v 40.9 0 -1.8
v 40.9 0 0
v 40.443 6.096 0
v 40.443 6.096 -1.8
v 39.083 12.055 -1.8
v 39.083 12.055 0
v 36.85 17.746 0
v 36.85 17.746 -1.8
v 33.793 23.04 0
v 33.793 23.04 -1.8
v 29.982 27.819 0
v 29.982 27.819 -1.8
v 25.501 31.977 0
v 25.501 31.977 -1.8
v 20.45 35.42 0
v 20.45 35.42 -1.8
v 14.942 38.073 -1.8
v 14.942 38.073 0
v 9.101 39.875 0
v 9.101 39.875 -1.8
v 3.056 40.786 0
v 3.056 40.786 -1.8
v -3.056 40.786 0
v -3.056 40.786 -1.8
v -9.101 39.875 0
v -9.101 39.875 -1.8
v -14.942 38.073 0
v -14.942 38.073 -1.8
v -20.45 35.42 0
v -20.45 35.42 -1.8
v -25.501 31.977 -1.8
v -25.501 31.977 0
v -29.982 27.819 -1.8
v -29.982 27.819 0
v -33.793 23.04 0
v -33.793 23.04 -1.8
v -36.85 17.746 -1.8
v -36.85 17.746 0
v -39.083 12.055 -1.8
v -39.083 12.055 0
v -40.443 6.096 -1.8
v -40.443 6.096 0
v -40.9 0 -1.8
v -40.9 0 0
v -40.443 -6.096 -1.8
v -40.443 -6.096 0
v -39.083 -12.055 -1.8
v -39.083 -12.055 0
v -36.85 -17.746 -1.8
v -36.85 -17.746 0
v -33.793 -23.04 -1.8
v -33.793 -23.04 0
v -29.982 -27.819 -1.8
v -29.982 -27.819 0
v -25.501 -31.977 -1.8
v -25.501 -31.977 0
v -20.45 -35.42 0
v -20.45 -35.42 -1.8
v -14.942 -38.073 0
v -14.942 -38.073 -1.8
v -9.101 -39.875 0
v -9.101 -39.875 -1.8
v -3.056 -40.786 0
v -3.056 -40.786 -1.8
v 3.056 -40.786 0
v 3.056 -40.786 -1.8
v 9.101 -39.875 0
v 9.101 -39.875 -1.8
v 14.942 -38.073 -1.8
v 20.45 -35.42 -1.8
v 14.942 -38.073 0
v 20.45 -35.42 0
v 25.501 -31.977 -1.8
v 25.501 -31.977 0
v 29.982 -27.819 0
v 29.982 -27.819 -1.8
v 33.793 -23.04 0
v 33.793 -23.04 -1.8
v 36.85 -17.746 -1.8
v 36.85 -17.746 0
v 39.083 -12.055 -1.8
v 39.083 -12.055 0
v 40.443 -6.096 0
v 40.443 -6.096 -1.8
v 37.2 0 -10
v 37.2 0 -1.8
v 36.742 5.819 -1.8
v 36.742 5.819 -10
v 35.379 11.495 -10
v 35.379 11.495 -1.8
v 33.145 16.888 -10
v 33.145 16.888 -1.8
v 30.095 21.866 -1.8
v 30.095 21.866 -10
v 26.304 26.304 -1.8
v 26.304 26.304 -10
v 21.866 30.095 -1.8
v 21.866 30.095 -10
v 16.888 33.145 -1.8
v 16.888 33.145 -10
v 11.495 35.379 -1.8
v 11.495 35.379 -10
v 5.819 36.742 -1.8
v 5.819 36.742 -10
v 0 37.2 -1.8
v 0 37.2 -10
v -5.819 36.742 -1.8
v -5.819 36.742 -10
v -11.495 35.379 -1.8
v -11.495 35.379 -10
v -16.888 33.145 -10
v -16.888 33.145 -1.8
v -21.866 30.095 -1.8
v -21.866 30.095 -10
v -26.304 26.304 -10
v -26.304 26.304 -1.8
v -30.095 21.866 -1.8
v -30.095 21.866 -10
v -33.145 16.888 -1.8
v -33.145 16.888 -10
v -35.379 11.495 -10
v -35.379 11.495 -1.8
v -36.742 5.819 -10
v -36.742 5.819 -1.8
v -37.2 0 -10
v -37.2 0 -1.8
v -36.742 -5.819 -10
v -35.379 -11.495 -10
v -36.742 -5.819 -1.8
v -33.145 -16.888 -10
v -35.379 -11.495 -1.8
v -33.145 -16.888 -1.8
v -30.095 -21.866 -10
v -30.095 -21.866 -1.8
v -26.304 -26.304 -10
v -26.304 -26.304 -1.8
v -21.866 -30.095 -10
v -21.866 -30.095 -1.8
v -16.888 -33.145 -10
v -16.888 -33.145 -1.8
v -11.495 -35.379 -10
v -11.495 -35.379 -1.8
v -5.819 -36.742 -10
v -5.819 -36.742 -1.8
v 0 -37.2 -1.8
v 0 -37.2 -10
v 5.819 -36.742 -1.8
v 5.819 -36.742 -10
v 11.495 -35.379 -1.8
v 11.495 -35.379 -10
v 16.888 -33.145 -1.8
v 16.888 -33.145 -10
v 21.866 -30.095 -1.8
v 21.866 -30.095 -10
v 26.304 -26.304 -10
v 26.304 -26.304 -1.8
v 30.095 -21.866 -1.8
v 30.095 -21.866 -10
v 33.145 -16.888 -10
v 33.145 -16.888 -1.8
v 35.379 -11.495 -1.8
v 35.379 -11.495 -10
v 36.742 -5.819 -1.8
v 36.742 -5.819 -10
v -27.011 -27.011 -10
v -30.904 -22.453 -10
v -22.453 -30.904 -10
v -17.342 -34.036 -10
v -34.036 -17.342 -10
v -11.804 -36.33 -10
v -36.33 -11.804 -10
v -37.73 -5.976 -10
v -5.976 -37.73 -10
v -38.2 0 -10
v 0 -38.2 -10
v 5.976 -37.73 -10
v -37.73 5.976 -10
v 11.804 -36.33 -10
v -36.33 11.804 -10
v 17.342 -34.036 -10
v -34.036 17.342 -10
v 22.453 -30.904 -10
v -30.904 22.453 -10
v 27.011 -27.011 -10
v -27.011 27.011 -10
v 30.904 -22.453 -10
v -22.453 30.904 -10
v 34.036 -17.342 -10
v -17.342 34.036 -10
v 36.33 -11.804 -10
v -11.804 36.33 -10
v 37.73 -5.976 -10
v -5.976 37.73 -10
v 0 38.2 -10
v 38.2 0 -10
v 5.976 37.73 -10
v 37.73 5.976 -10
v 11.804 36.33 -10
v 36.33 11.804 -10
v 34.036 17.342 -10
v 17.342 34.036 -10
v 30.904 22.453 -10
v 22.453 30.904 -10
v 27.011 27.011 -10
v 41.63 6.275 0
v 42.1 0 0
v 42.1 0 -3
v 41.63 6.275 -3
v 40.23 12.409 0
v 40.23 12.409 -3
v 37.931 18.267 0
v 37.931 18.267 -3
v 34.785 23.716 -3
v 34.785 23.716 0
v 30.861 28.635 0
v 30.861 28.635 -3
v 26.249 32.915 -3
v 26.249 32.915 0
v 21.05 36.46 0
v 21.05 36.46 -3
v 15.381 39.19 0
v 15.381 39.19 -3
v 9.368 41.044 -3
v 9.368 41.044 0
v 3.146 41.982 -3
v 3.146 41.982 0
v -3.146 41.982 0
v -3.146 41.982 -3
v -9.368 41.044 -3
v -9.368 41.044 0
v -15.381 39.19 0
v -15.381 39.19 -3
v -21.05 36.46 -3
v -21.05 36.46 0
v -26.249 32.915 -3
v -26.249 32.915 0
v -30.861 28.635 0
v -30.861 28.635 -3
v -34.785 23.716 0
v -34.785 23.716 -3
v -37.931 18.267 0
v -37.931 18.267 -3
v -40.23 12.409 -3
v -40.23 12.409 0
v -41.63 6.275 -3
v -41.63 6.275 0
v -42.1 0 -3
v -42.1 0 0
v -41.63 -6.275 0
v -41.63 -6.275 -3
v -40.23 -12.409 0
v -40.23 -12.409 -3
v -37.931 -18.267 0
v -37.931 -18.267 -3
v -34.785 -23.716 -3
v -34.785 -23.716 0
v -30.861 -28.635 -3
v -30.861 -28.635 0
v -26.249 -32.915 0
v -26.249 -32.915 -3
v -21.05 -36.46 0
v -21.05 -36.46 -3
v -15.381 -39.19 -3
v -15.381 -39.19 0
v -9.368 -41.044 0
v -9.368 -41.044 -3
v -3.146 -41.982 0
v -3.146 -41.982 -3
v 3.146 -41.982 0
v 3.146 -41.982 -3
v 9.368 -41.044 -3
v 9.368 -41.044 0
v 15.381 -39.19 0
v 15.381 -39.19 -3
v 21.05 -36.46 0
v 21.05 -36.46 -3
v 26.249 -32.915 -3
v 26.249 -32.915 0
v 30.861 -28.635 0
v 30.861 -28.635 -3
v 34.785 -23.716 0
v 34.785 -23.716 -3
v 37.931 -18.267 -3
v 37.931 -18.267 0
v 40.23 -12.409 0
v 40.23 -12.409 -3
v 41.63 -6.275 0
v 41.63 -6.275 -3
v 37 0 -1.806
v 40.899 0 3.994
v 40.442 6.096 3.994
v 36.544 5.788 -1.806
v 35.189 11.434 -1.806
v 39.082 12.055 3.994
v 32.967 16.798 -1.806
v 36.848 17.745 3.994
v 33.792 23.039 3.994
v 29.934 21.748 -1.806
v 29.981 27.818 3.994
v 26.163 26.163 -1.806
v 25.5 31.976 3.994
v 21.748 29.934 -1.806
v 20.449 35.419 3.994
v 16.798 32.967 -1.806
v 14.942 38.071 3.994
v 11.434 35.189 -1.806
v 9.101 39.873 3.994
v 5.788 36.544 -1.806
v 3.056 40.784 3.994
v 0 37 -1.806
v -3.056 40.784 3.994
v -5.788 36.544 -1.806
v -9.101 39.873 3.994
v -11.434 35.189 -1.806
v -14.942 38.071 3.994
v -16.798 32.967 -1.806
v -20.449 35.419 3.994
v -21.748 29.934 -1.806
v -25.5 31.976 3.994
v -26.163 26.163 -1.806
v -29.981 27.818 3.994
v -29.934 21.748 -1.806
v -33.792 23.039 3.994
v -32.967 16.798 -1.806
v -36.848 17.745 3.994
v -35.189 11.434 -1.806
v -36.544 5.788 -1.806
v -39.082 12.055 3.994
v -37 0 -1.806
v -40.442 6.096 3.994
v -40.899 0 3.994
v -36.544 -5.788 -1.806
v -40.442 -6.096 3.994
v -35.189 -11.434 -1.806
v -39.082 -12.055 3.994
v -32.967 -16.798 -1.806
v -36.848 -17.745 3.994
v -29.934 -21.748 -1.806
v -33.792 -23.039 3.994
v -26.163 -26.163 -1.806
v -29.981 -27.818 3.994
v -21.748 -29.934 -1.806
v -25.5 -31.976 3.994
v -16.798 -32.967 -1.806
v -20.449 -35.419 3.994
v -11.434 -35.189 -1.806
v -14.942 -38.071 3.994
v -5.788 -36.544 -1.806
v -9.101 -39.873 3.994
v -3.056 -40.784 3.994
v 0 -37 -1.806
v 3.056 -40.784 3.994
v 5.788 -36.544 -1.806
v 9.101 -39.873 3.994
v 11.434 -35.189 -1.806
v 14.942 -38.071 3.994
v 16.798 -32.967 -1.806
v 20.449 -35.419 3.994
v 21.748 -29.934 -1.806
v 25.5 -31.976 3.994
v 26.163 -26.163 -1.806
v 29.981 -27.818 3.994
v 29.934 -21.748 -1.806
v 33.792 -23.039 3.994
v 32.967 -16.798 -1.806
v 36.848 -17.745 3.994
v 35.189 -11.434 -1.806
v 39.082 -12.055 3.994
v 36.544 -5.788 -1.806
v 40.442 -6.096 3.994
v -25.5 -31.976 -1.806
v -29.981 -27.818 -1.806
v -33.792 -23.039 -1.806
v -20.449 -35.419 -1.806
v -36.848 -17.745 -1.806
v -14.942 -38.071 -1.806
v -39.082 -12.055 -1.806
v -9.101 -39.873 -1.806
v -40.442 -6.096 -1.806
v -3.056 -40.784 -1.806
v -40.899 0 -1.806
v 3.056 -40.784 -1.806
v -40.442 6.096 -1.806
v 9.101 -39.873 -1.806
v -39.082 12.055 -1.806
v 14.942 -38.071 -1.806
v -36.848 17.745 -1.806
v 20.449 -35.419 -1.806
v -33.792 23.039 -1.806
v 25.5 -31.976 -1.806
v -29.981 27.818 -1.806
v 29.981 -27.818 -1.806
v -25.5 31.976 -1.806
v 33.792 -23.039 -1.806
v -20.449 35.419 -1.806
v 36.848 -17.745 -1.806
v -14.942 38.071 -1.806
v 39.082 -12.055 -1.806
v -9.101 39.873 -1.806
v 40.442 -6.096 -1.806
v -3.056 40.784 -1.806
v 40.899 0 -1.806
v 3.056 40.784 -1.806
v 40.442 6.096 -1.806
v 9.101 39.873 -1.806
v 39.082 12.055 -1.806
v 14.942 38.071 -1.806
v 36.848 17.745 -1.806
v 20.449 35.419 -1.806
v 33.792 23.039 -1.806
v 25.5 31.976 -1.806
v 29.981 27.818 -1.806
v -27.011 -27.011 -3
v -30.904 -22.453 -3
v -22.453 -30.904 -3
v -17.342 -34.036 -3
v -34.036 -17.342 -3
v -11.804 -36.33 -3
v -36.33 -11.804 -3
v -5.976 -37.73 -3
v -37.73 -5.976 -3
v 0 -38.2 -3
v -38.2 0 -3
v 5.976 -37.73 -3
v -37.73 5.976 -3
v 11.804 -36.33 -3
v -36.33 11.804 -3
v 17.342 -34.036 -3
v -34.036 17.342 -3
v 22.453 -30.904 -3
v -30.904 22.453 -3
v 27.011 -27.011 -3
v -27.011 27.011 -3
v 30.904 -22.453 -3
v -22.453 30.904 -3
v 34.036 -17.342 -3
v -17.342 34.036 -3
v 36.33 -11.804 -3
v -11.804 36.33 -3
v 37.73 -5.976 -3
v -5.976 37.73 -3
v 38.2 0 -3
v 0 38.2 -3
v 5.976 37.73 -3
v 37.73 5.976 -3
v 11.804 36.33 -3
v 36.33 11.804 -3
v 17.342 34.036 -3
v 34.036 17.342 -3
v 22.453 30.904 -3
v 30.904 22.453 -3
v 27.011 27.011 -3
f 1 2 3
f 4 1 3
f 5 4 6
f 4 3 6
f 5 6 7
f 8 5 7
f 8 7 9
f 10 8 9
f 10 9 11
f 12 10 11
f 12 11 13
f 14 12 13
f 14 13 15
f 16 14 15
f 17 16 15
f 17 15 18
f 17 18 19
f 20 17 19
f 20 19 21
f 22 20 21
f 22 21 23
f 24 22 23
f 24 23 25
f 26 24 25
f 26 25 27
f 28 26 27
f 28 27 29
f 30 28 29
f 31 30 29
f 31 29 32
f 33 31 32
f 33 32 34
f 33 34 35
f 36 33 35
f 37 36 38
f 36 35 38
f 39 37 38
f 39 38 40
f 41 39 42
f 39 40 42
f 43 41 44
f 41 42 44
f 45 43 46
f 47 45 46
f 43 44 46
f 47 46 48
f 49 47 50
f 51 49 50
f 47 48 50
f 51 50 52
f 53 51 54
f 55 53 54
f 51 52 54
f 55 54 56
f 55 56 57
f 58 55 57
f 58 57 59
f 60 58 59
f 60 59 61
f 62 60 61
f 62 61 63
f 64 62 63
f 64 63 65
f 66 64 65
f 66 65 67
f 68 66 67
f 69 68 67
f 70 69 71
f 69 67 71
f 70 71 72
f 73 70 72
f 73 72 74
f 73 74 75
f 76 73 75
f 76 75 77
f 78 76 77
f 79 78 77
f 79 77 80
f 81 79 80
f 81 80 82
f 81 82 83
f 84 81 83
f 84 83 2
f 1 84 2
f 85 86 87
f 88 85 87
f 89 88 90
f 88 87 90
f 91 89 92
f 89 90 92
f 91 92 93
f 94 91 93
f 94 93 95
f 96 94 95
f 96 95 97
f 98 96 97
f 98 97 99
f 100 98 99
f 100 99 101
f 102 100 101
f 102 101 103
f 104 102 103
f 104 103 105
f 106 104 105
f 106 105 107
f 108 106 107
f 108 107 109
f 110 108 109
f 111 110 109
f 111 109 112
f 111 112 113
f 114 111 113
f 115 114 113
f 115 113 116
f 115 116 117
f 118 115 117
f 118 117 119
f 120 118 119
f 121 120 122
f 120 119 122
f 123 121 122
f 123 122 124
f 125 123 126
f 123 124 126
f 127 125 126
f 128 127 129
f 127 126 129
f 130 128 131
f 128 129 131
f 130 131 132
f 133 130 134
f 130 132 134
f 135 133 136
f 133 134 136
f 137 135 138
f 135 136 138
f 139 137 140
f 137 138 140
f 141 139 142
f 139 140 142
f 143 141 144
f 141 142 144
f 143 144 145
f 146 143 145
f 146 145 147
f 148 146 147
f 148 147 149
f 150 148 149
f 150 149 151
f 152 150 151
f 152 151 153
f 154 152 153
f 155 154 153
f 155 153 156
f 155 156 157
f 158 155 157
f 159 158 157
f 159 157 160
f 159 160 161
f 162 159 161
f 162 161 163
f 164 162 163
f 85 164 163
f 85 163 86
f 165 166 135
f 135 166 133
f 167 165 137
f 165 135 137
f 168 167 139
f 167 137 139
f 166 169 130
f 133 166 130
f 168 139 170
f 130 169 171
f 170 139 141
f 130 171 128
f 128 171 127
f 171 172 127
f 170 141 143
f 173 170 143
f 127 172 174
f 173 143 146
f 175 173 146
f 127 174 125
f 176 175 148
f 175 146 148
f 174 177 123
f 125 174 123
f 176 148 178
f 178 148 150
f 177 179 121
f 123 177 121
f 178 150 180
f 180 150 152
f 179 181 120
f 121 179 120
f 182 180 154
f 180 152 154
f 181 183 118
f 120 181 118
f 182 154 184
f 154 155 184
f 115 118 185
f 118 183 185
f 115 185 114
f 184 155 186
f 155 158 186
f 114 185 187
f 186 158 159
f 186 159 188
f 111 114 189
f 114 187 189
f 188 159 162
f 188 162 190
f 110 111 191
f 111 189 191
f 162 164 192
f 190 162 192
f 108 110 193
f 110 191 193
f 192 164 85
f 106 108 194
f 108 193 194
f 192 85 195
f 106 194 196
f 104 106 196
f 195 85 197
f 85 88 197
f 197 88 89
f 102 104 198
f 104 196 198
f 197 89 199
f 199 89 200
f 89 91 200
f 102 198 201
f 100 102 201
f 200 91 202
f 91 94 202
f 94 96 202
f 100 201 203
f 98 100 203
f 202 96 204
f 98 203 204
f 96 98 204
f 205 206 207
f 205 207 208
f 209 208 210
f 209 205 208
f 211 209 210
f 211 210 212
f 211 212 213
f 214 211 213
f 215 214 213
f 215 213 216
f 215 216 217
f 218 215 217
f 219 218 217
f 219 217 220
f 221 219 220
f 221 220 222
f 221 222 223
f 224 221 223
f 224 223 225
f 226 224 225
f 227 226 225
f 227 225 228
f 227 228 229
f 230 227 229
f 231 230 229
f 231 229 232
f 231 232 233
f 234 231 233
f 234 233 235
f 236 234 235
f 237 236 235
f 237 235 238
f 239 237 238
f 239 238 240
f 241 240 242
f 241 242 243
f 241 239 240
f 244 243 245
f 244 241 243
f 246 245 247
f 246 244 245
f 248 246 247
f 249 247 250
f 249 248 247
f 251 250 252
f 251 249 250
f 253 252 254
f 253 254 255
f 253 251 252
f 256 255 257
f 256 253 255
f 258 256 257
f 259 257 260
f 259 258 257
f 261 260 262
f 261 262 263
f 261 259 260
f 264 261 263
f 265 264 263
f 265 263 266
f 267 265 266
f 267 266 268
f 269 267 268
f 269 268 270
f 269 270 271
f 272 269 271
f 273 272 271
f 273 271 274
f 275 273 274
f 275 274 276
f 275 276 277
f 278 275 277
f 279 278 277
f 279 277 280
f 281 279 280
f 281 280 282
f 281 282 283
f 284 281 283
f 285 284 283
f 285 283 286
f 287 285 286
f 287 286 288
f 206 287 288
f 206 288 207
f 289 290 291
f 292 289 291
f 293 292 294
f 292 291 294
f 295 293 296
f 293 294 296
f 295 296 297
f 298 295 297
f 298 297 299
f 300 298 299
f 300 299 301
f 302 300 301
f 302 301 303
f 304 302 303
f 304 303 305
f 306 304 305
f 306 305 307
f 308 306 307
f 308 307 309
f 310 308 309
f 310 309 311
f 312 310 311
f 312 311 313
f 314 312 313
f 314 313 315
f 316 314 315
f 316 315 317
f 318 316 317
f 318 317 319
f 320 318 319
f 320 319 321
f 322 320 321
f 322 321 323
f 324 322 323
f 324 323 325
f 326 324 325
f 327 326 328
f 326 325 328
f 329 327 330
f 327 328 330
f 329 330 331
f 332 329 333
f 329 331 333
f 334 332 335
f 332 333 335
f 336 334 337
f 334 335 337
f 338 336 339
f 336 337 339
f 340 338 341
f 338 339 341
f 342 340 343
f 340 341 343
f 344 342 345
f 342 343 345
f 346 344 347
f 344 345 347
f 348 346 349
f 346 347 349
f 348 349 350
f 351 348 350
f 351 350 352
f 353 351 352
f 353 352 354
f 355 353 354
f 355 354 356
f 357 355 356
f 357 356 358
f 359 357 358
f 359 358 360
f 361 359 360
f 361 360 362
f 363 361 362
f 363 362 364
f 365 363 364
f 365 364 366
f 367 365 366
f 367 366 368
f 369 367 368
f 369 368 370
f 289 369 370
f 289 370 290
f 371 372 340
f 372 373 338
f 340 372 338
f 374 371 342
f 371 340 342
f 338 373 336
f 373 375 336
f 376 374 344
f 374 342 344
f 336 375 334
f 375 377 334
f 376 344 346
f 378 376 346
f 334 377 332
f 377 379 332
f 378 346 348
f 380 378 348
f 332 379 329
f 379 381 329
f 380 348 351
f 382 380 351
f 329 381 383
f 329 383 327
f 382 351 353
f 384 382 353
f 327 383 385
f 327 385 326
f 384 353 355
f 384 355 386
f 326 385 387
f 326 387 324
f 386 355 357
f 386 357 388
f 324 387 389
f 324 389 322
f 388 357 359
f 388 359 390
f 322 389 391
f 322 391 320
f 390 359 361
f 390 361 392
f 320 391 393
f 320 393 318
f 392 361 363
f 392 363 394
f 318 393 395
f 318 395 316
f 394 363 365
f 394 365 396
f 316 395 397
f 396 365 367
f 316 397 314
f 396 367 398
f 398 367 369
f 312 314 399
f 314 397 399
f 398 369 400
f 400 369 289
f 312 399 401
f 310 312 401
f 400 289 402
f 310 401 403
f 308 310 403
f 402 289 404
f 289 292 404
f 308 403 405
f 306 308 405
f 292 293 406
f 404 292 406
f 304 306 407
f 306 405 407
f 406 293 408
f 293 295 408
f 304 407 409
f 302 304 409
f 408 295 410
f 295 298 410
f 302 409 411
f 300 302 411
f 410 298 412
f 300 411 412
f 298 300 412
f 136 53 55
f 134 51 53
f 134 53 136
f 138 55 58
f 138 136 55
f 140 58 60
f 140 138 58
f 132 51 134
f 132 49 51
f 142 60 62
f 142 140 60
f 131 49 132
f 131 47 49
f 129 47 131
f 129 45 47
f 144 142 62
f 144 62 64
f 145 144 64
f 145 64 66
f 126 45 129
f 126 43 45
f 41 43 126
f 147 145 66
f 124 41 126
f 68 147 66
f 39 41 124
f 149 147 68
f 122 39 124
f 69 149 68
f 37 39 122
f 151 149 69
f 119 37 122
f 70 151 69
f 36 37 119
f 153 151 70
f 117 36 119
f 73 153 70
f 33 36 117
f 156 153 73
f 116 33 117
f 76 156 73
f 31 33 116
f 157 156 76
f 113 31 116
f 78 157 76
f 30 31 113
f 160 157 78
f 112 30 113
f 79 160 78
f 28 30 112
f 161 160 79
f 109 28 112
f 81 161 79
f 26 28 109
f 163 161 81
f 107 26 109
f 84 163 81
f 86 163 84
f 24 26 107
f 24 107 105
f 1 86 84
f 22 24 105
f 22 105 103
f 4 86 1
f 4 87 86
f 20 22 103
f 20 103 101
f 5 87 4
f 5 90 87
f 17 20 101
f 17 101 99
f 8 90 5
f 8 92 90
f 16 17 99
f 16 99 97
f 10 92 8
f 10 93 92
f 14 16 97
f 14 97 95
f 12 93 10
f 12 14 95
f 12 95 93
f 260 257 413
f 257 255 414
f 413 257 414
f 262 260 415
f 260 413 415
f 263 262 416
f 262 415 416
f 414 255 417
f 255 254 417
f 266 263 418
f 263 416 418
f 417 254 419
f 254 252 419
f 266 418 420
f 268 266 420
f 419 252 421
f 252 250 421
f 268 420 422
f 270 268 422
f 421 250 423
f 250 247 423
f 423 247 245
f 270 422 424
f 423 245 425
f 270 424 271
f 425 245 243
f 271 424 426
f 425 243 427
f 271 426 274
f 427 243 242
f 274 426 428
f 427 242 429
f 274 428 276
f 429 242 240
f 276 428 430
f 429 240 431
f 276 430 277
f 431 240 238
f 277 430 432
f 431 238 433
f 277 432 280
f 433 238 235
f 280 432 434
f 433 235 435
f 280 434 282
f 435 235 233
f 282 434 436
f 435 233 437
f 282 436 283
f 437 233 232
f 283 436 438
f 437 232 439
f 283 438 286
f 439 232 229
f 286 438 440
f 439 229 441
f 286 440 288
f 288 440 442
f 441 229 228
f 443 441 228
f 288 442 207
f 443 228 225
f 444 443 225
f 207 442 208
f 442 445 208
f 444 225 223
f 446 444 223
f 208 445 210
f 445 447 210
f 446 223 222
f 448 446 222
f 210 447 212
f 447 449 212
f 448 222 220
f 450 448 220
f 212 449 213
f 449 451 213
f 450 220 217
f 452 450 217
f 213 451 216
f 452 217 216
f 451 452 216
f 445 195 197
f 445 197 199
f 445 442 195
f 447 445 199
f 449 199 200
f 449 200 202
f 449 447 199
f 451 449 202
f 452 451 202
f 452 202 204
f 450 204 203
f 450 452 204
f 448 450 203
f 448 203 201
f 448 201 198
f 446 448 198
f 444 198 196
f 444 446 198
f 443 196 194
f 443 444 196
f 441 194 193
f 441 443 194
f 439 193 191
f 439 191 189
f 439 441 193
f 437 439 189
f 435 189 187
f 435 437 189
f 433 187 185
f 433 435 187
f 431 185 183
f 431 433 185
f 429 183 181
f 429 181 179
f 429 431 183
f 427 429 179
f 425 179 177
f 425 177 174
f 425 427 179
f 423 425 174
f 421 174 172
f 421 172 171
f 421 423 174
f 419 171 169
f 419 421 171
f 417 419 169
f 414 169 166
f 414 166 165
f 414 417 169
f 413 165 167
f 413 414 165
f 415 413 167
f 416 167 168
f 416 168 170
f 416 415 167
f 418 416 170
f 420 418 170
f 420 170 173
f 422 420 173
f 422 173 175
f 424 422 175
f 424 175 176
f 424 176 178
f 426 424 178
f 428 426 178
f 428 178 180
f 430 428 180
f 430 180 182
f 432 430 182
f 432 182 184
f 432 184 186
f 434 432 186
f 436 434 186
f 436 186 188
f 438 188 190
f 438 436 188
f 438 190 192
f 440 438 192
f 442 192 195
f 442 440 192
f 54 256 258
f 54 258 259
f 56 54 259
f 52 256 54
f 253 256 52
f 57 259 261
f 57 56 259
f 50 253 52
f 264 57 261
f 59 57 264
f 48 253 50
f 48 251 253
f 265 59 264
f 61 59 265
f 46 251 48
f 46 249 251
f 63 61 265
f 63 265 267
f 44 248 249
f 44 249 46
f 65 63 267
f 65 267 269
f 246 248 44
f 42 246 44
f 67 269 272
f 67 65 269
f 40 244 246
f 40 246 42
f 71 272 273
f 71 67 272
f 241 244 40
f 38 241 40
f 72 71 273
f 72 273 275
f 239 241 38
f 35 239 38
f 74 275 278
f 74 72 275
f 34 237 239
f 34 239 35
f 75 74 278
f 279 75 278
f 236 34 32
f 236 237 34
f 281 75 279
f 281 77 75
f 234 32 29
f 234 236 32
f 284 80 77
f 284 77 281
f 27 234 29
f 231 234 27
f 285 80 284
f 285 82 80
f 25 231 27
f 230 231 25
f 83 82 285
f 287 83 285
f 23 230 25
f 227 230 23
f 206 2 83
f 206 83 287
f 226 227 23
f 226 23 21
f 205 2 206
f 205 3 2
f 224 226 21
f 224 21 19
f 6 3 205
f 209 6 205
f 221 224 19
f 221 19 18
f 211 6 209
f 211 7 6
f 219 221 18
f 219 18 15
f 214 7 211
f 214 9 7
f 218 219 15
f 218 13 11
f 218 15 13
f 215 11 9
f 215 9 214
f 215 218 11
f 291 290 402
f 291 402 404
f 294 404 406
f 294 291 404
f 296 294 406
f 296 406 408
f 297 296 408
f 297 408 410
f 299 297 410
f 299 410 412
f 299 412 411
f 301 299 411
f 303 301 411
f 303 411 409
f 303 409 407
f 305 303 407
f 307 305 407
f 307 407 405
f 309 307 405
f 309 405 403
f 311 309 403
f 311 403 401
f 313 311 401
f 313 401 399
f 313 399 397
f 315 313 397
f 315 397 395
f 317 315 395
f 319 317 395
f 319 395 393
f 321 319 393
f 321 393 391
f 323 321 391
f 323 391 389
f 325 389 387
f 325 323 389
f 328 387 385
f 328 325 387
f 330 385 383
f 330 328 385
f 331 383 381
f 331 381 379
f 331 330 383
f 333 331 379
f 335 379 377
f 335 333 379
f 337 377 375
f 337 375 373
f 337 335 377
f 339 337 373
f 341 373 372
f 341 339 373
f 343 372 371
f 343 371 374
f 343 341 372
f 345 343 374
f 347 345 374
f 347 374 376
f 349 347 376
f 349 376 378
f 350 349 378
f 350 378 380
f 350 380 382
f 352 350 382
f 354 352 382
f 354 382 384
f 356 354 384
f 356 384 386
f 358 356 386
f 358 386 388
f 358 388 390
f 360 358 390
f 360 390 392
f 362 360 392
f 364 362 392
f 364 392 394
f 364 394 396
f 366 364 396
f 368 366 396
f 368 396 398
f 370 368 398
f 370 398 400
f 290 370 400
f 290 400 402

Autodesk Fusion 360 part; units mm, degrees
sketch "Skizze14" plane through (0, 0, 0) normal (0, 0, 1) x (1, 0, 0)
  circle A0 centre (0, 0) radius 38.2
  circle A1 centre (0, 0) radius 37.2
  dimension "d43" = 76.4
  dimension "d44" = -1
extrude "Extrusion11" add sketch "Skizze14" against normal blind 10 makes body 1
sketch "Skizze15" plane through (0, 0, 0) normal (0, 1, 0) x (1, 0, 0)
sketch "Skizze16" plane through (0, 0, 0) normal (0, 0, 1) x (1, 0, 0)
  circle A0 centre (0, 0) radius 42.1
  circle A1 centre (0, 0) radius 38.2
  dimension "d47" = 84.2
  dimension "d48" = -3.9
extrude "Extrusion12" add sketch "Skizze16" against normal blind 3 bodies 1
sketch "Skizze1" plane through (0, 0, 0) normal (0, 0, 1) x (1, 0, 0)
  circle A0 centre (0, 0) radius 42.1
  circle A1 centre (0, 0) radius 40.9
  dimension "d1" = 84.2
  dimension "d2" = -1.2
sketch "Skizze17" plane through (0, 0, 0) normal (0, 1, 0) x (1, 0, 0)
sketch "Skizze18" plane through (0, 0, 0) normal (0, 0, 1) x (1, 0, 0)
  circle A0 centre (0, 0) radius 40.9
  dimension "d53" = 81.8
extrude "Extrusion13" cut sketch "Skizze18" against normal blind 1.8 bodies 1
sketch "Skizze19" plane through (0, 0, 0) normal (0, 0, 1) x (1, 0, 0)
ref_plane "Arbeitsebene2" through (0, 0, -1.8) normal (0, 0, 1) x (1, 0, 0)
sketch "Skizze20" plane through (0, 0, -1.8) normal (0, 0, 1) x (1, 0, 0)
sketch "Skizze21" plane through (0, 0, 0) normal (0, 1, 0) x (1, 0, 0)
ref_plane "Arbeitsebene4" through (0, 0, -1.8) normal (0, 0, 1) x (1, 0, 0)
sketch "Skizze26" plane through (0, 0, -1.8) normal (0, 0, 1) x (1, 0, 0)
sketch "Skizze27" plane through (0, 0, 0) normal (0, 1, 0) x (1, 0, 0)
sketch "Skizze28" plane through (0, 0, 0) normal (0, 1, 0) x (1, 0, 0)
sketch "Skizze29" plane through (0, 0, 0) normal (0, 1, 0) x (1, 0, 0)
  line L0 (42, 0) -> (41.7559, 0)
  line L1 (40.8986, 1.8065) -> (40.8986, -3.9935)
  line L2 (40.8986, 1.8065) -> (37, 1.8065)
  line L3 (40.8986, -3.9935) -> (37, 1.8065)
  dimension "d67" = 5.8
revolve "Drehen3" add sketch "Skizze29" angle 360 about axis through (0, 0, 1.75) along (0, 0, 1) separate body makes body 2
sketch "Skizze30" plane through (0, 0, 0) normal (0, 0, 1) x (1, 0, 0)
sketch "Skizze22" plane through (0, 0, 0) normal (0, 1, 0) x (1, 0, 0)
sketch "Skizze23" plane through (0, 0, -1.8) normal (0, 0, 1) x (1, 0, 0)
ref_plane "Arbeitsebene3" through (0, -1.8, 0) normal (0, 1, 0) x (0, 0, 1)
equation "d44 = 1 mm - 2 mm"
